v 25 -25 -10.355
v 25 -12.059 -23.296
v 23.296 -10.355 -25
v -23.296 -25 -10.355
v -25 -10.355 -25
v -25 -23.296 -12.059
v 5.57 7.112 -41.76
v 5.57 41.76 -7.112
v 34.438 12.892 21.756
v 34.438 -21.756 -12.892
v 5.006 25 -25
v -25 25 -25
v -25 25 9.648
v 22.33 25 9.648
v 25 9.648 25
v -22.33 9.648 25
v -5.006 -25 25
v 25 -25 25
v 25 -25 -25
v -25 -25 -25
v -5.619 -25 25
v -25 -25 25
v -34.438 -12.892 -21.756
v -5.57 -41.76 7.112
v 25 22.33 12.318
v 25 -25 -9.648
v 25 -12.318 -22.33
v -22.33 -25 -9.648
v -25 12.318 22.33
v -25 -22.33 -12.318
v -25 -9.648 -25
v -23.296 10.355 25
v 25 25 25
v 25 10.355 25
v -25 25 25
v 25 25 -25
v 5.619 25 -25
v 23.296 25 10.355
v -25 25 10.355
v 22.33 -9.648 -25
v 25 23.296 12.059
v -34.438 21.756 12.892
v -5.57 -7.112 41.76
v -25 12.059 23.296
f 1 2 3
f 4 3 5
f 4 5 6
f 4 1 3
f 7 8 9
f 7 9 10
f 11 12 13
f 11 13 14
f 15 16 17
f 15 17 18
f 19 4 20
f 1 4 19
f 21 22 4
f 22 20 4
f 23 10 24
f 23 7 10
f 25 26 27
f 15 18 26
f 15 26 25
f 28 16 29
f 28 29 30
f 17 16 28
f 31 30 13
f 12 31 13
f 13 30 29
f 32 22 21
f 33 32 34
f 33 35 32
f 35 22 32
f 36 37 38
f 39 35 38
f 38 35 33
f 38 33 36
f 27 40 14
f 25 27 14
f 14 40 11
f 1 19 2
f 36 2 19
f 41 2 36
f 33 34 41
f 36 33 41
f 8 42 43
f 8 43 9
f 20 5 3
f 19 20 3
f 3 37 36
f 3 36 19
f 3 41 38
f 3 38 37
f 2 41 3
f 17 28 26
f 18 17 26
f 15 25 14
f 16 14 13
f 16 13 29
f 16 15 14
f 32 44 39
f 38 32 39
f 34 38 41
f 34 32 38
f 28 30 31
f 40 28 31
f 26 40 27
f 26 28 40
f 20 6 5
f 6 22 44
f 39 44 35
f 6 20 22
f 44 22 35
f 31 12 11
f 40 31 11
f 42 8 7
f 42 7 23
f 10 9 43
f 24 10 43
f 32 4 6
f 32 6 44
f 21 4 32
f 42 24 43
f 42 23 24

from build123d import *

# Parameters (mm, degrees)
F1_W          = 50
F1_H          = 50
F2_DEPTH      = 25
F5_DEPTH      = 43.3022701892
F5_DEPTH_BACK = 43.3022701892
F6_DEPTH      = 25


with BuildPart() as f2:
    # F1 (on Top) → F2 (new body, symmetric)
    with BuildSketch(Plane.XY):
        Rectangle(F1_W, F1_H)
    extrude(amount=F2_DEPTH, both=True)

    # F4 (on mid) → F5 (cut, two sides)
    with BuildSketch(Plane(origin=(0, 0, 0), x_dir=(-0.8164965809, -0.4082482905, 0.4082482905), z_dir=(-0.5773502692, 0.5773502692, -0.5773502692))) as f5_sk:
        Polygon((-25, -25), (-14.4337567297, -25), (-14.1450815951, -24.5), (-24.5, -24.5), (-24.5, 24.5), (-14.1450815951, 24.5), (-14.4337567297, 25), (-25, 25), align=None)
        Polygon((-14.1450815951, -24.5), (-14.4337567297, -25), (25, -25), (25, 0), (24.5, 0), (24.5, -24.5), align=None)
        Polygon((25, 25), (-14.4337567297, 25), (-14.1450815951, 24.5), (24.5, 24.5), (24.5, 0), (25, 0), align=None)
    extrude(amount=-F5_DEPTH, mode=Mode.SUBTRACT)
    extrude(f5_sk.sketch, amount=F5_DEPTH_BACK, mode=Mode.SUBTRACT)


with BuildPart() as f6:
    # F4 (on mid) → F6 (new body, symmetric)
    with BuildSketch(Plane(origin=(0, 0, 0), x_dir=(-0.8164965809, -0.4082482905, 0.4082482905), z_dir=(-0.5773502692, 0.5773502692, -0.5773502692))):
        Polygon((-14.1450815951, 24.5), (0, 0), (24.5, 0), (24.5, 24.5), align=None)
        Polygon((0, 0), (-14.1450815951, -24.5), (24.5, -24.5), (24.5, 0), align=None)
        Polygon((-24.5, -24.5), (-14.1450815951, -24.5), (0, 0), (-14.1450815951, 24.5), (-24.5, 24.5), align=None)
    extrude(amount=F6_DEPTH, both=True)


solid = Compound([f2.part, f6.part])
